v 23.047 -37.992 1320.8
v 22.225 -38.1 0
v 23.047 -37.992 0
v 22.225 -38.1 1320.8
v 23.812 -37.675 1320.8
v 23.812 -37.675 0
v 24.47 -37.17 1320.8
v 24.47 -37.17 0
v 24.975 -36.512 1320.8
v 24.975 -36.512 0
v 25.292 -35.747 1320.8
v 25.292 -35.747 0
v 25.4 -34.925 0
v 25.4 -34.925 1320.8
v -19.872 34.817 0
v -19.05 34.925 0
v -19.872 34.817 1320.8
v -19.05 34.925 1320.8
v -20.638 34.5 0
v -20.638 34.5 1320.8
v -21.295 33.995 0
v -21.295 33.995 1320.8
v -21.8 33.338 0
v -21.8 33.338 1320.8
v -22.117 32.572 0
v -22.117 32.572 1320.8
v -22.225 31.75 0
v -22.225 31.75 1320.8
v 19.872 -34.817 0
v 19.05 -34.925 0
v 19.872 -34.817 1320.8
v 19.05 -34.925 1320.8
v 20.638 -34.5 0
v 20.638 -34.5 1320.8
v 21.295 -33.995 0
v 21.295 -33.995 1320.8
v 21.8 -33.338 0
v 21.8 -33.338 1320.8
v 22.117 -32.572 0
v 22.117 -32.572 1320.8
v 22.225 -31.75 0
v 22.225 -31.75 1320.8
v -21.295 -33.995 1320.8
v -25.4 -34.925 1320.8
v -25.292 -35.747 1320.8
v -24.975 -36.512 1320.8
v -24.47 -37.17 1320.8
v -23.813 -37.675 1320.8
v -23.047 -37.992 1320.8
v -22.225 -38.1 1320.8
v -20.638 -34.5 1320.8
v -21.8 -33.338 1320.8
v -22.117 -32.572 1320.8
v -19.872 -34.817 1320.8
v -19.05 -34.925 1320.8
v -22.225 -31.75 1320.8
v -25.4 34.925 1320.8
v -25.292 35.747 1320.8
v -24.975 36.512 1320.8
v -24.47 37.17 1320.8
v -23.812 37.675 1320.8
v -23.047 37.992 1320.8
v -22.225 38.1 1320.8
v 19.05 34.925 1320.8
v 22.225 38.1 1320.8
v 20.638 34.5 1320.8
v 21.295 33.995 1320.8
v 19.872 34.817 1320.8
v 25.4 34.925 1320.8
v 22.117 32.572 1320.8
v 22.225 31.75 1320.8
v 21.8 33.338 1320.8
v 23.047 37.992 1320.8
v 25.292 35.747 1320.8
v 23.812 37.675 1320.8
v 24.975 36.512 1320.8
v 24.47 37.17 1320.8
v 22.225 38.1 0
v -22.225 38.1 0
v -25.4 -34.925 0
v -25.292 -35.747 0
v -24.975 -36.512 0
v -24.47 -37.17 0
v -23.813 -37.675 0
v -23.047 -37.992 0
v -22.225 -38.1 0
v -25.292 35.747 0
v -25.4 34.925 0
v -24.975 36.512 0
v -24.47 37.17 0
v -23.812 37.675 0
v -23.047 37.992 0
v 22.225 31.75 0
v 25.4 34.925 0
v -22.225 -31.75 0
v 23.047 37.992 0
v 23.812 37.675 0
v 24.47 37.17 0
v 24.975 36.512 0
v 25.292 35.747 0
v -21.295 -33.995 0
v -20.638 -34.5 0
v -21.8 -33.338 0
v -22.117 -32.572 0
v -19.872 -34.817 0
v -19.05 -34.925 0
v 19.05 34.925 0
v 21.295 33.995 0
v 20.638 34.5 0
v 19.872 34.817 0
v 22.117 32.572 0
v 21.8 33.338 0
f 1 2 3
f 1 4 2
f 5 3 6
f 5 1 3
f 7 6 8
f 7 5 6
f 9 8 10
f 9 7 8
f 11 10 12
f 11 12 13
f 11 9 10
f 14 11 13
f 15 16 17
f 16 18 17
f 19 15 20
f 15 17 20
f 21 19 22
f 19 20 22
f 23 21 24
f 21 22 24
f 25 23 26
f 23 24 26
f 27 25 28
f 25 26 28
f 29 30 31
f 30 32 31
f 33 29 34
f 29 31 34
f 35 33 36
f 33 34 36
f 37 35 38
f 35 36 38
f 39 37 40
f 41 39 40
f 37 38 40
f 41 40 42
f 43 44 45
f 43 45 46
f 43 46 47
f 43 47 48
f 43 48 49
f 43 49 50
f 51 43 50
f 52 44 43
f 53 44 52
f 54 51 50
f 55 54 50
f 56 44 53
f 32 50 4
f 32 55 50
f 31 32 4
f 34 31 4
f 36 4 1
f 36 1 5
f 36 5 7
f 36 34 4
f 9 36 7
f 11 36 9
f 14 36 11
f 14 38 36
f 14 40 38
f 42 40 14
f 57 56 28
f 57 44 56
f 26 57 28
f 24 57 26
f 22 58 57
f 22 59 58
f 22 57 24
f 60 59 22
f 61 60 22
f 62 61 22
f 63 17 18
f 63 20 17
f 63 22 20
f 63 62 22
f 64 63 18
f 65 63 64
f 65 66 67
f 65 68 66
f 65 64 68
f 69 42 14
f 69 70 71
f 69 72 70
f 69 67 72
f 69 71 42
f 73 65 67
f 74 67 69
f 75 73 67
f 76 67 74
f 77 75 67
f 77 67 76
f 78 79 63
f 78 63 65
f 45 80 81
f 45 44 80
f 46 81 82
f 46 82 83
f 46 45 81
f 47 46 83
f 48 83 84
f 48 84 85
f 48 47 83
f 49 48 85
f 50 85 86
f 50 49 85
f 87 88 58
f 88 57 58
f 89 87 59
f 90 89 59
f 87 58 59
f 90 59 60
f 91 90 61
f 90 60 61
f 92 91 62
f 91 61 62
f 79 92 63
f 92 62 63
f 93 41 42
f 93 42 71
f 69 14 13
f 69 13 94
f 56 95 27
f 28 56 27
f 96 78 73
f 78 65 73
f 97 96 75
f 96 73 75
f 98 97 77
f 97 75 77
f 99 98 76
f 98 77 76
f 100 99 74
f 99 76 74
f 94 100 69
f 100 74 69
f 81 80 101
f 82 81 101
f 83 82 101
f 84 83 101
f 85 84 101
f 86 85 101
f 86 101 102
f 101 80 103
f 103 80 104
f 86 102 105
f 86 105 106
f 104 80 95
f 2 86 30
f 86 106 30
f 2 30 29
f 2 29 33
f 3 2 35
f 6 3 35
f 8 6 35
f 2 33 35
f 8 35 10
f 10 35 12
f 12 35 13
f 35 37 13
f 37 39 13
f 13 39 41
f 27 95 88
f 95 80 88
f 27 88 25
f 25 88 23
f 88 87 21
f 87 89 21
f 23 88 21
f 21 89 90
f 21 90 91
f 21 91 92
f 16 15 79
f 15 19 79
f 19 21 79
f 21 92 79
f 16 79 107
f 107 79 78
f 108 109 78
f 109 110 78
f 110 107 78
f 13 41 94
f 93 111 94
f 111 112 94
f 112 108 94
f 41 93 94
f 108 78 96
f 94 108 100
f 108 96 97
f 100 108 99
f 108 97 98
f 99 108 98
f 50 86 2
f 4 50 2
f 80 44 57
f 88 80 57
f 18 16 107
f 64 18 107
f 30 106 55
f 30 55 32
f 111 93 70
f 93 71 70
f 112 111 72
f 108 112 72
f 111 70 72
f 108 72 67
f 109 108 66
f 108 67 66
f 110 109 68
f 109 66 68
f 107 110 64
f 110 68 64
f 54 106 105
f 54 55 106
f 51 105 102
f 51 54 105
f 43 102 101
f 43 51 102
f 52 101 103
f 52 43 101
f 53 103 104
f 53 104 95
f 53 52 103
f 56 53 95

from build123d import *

# Parameters (mm, degrees)
F0_W     = 50.8
F0_H     = 76.2
F0_W_2   = 44.45
F0_H_2   = 69.85
F2_DEPTH = 1320.8
F3_R     = 3.175


# Not quite as in the source:
# - a variable given as a bare number and used for a length is read in inches; the dataset says mm whatever the document's units were


with BuildPart() as f2:
    # F0 (on Top) → F2 (new body)
    with BuildSketch(Plane.XY):
        Rectangle(F0_W, F0_H)
        Rectangle(F0_W_2, F0_H_2, mode=Mode.SUBTRACT)
    extrude(amount=F2_DEPTH)

    # F3
    f3_edges = [f2.edges().sort_by_distance(p)[0] for p in [
        (25.4, 38.1, 660.4),
        (-25.4, 38.1, 660.4),
        (25.4, -38.1, 660.4),
        (22.225, -34.925, 660.4),
        (-22.225, -34.925, 660.4),
        (-22.225, 34.925, 660.4),
        (22.225, 34.925, 660.4),
        (-25.4, -38.1, 660.4),
    ]]
    fillet(f3_edges, radius=F3_R)


solid = f2.part
